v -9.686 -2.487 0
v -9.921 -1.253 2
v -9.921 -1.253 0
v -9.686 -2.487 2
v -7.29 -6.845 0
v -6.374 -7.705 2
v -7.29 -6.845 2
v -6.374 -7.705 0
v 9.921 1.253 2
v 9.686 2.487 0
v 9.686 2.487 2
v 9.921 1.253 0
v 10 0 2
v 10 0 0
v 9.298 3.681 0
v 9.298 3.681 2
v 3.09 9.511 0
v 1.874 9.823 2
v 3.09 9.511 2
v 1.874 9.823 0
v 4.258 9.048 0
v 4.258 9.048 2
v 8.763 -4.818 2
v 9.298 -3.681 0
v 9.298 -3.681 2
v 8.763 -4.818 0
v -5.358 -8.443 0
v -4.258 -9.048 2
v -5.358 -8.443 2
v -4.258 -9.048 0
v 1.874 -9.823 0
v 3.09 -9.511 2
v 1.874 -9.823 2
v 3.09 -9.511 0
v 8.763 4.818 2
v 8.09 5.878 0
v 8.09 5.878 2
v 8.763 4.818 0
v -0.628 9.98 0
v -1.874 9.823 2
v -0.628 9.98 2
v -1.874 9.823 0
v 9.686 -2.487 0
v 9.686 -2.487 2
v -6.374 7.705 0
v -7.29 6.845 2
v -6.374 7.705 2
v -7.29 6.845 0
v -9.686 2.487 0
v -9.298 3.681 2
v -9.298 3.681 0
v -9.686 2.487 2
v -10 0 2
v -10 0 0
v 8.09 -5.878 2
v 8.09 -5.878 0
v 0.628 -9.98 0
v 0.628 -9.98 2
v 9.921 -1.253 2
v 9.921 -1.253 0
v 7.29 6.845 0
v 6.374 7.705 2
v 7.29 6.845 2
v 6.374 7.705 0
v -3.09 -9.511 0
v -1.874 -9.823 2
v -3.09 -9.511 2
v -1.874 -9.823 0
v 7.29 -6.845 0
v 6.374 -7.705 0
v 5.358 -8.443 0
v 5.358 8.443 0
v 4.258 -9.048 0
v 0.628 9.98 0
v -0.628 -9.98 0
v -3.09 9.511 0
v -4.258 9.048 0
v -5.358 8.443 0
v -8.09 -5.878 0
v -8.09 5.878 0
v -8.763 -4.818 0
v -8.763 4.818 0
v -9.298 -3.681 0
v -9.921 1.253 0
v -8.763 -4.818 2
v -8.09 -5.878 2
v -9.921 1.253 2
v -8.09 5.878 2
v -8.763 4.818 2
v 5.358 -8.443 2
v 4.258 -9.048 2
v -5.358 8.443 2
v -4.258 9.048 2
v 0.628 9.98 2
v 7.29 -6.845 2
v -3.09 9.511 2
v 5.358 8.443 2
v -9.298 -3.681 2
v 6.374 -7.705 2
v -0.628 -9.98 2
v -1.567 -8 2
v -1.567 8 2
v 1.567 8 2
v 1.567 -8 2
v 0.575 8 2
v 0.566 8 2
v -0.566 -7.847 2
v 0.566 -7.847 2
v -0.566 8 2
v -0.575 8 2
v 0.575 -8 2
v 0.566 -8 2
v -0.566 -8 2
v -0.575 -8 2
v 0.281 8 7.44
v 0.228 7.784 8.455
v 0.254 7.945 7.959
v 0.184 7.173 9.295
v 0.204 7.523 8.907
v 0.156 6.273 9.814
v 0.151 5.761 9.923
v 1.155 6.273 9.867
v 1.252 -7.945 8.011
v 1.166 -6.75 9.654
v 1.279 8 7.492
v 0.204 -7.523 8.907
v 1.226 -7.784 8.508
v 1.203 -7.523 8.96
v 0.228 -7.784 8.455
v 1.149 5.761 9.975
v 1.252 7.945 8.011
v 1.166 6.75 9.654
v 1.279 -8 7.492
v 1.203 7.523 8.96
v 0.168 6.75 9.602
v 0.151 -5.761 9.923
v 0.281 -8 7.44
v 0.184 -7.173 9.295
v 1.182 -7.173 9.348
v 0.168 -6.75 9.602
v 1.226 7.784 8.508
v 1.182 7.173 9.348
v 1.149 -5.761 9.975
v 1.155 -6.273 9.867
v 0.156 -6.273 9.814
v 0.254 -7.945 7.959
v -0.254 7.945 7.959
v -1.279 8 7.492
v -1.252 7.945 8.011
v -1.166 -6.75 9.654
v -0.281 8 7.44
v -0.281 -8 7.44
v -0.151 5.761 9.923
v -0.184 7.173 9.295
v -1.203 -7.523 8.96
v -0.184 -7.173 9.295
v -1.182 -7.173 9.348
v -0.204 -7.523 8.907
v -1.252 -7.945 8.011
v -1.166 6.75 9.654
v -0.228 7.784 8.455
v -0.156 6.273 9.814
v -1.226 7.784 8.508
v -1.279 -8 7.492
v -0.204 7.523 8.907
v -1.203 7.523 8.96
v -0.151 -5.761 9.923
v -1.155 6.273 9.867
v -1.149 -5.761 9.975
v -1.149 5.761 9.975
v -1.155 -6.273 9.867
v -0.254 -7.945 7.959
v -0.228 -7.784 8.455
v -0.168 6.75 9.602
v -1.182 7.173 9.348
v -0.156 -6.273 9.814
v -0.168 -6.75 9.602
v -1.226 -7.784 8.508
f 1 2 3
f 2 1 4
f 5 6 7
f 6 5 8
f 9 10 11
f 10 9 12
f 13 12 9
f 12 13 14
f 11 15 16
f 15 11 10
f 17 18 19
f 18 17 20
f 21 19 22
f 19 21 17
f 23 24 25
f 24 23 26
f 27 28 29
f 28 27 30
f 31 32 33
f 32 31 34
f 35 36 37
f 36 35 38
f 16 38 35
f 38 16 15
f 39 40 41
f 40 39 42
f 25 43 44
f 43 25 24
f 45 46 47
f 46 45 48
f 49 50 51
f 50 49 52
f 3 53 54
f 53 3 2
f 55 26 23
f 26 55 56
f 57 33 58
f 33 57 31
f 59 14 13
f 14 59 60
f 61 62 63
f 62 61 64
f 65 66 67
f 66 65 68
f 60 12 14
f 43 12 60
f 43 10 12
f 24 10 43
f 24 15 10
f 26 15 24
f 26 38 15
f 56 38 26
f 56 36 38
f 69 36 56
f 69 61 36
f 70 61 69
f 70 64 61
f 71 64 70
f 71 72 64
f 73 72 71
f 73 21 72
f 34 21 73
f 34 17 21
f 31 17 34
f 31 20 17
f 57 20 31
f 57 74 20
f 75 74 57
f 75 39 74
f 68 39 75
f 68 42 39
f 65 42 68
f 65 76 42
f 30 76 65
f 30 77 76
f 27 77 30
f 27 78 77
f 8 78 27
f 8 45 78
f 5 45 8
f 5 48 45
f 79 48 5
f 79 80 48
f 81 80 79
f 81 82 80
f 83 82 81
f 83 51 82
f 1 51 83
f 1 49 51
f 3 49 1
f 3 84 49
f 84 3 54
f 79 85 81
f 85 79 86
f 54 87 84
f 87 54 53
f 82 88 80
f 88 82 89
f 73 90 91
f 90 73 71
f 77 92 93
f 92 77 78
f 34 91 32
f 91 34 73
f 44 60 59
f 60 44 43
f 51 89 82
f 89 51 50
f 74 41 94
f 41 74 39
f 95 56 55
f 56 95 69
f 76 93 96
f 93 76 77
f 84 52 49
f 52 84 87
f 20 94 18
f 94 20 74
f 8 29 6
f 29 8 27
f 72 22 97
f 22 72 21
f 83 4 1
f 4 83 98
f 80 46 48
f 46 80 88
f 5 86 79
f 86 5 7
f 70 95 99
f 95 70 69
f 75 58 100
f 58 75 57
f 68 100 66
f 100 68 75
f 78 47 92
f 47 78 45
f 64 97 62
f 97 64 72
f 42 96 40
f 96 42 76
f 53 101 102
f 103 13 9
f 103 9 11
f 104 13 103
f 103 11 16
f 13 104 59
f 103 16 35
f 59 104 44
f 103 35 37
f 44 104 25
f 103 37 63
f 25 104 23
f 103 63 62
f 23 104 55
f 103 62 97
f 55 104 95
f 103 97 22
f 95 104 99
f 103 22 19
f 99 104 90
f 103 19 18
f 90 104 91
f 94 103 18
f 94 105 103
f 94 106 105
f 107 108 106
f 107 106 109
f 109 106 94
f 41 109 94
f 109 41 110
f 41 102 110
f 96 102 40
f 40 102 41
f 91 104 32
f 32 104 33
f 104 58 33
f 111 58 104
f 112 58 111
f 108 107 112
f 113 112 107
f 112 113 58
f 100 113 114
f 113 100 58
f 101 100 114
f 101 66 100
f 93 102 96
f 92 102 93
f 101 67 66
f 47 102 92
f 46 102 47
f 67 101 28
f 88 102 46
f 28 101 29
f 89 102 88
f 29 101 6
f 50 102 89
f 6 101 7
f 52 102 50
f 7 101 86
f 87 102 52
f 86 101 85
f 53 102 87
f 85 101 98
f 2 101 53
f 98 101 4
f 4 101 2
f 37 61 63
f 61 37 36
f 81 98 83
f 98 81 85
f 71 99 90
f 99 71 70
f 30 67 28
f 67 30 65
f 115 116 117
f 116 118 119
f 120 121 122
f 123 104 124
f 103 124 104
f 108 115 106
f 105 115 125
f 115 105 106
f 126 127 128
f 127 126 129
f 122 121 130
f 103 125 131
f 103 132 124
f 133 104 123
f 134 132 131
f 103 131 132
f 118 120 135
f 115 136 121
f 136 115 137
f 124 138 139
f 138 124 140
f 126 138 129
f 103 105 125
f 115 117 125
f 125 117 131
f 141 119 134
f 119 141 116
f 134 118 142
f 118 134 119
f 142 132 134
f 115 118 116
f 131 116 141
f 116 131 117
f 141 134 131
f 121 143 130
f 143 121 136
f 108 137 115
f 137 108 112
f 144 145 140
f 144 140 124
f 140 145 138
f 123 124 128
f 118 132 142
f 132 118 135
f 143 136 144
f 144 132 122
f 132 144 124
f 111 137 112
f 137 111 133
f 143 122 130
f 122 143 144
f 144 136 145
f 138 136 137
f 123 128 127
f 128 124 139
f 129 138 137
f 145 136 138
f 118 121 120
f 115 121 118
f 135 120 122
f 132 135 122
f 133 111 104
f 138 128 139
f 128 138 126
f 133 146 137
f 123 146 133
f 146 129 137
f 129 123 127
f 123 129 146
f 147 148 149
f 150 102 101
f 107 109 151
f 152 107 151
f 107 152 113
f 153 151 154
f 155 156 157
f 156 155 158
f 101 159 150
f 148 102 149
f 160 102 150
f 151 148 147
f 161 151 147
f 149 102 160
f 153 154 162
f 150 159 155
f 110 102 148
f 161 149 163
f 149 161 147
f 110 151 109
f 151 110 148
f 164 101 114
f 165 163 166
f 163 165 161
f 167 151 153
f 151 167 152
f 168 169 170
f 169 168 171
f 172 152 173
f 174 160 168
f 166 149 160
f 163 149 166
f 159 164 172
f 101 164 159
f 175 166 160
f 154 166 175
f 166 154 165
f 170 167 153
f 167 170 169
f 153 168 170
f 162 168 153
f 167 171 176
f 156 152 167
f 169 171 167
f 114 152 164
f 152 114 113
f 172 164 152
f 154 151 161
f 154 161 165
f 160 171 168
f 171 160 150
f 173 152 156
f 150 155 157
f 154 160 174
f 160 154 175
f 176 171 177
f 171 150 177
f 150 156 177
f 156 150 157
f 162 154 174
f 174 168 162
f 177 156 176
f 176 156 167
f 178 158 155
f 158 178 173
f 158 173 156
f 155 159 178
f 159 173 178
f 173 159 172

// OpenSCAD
/*Simple standee*/

/*[Basic parameters]*/
base_diameter = 20;

base_height = 2;
//minimal distance between "slot" walls for insert
gap = 0.3;
//Slot height
slot_height=8;

slot_width = 1;

slot_length = 16;

/*[A bit of advanced ones]*/
//Slot corner diameter
slot_diameter = 5;
//pivot - upper inner edge of slot walls, gap raimains unchanged
angle = 3;

union(){
    cylinder(h=base_height, d=base_diameter, $fn=50);
    placeWall();
    mirror([1,0,0])placeWall();
}

module placeWall(){
    c1 = slot_height*(1-cos(angle))/cos(angle);
    c2 = slot_width*tan(angle);
    C=c1+c2;
  translate([gap/2.0,-slot_length/2.0,base_height-C])
    slotWall(slot_height+C,slot_width,slot_length,slot_diameter,angle);    
}


module slotWall(){
    translate([0,0,slot_height])
    rotate(a=[0,-angle,0])
    translate([0,0,-slot_height])
    rotate(a=[90,0,90])
    hull(){
        cylinder(slot_width,d=0.0001);
        translate([slot_length,0,0])cylinder(slot_width,d=0.0001);
        translate([slot_diameter/2,slot_height-slot_diameter/2,0])cylinder(slot_width,d=slot_diameter, $fn=30);
        translate([slot_length-slot_diameter/2,slot_height-slot_diameter/2,0])cylinder(slot_width,d=slot_diameter,$fn=30); 
    }
}
